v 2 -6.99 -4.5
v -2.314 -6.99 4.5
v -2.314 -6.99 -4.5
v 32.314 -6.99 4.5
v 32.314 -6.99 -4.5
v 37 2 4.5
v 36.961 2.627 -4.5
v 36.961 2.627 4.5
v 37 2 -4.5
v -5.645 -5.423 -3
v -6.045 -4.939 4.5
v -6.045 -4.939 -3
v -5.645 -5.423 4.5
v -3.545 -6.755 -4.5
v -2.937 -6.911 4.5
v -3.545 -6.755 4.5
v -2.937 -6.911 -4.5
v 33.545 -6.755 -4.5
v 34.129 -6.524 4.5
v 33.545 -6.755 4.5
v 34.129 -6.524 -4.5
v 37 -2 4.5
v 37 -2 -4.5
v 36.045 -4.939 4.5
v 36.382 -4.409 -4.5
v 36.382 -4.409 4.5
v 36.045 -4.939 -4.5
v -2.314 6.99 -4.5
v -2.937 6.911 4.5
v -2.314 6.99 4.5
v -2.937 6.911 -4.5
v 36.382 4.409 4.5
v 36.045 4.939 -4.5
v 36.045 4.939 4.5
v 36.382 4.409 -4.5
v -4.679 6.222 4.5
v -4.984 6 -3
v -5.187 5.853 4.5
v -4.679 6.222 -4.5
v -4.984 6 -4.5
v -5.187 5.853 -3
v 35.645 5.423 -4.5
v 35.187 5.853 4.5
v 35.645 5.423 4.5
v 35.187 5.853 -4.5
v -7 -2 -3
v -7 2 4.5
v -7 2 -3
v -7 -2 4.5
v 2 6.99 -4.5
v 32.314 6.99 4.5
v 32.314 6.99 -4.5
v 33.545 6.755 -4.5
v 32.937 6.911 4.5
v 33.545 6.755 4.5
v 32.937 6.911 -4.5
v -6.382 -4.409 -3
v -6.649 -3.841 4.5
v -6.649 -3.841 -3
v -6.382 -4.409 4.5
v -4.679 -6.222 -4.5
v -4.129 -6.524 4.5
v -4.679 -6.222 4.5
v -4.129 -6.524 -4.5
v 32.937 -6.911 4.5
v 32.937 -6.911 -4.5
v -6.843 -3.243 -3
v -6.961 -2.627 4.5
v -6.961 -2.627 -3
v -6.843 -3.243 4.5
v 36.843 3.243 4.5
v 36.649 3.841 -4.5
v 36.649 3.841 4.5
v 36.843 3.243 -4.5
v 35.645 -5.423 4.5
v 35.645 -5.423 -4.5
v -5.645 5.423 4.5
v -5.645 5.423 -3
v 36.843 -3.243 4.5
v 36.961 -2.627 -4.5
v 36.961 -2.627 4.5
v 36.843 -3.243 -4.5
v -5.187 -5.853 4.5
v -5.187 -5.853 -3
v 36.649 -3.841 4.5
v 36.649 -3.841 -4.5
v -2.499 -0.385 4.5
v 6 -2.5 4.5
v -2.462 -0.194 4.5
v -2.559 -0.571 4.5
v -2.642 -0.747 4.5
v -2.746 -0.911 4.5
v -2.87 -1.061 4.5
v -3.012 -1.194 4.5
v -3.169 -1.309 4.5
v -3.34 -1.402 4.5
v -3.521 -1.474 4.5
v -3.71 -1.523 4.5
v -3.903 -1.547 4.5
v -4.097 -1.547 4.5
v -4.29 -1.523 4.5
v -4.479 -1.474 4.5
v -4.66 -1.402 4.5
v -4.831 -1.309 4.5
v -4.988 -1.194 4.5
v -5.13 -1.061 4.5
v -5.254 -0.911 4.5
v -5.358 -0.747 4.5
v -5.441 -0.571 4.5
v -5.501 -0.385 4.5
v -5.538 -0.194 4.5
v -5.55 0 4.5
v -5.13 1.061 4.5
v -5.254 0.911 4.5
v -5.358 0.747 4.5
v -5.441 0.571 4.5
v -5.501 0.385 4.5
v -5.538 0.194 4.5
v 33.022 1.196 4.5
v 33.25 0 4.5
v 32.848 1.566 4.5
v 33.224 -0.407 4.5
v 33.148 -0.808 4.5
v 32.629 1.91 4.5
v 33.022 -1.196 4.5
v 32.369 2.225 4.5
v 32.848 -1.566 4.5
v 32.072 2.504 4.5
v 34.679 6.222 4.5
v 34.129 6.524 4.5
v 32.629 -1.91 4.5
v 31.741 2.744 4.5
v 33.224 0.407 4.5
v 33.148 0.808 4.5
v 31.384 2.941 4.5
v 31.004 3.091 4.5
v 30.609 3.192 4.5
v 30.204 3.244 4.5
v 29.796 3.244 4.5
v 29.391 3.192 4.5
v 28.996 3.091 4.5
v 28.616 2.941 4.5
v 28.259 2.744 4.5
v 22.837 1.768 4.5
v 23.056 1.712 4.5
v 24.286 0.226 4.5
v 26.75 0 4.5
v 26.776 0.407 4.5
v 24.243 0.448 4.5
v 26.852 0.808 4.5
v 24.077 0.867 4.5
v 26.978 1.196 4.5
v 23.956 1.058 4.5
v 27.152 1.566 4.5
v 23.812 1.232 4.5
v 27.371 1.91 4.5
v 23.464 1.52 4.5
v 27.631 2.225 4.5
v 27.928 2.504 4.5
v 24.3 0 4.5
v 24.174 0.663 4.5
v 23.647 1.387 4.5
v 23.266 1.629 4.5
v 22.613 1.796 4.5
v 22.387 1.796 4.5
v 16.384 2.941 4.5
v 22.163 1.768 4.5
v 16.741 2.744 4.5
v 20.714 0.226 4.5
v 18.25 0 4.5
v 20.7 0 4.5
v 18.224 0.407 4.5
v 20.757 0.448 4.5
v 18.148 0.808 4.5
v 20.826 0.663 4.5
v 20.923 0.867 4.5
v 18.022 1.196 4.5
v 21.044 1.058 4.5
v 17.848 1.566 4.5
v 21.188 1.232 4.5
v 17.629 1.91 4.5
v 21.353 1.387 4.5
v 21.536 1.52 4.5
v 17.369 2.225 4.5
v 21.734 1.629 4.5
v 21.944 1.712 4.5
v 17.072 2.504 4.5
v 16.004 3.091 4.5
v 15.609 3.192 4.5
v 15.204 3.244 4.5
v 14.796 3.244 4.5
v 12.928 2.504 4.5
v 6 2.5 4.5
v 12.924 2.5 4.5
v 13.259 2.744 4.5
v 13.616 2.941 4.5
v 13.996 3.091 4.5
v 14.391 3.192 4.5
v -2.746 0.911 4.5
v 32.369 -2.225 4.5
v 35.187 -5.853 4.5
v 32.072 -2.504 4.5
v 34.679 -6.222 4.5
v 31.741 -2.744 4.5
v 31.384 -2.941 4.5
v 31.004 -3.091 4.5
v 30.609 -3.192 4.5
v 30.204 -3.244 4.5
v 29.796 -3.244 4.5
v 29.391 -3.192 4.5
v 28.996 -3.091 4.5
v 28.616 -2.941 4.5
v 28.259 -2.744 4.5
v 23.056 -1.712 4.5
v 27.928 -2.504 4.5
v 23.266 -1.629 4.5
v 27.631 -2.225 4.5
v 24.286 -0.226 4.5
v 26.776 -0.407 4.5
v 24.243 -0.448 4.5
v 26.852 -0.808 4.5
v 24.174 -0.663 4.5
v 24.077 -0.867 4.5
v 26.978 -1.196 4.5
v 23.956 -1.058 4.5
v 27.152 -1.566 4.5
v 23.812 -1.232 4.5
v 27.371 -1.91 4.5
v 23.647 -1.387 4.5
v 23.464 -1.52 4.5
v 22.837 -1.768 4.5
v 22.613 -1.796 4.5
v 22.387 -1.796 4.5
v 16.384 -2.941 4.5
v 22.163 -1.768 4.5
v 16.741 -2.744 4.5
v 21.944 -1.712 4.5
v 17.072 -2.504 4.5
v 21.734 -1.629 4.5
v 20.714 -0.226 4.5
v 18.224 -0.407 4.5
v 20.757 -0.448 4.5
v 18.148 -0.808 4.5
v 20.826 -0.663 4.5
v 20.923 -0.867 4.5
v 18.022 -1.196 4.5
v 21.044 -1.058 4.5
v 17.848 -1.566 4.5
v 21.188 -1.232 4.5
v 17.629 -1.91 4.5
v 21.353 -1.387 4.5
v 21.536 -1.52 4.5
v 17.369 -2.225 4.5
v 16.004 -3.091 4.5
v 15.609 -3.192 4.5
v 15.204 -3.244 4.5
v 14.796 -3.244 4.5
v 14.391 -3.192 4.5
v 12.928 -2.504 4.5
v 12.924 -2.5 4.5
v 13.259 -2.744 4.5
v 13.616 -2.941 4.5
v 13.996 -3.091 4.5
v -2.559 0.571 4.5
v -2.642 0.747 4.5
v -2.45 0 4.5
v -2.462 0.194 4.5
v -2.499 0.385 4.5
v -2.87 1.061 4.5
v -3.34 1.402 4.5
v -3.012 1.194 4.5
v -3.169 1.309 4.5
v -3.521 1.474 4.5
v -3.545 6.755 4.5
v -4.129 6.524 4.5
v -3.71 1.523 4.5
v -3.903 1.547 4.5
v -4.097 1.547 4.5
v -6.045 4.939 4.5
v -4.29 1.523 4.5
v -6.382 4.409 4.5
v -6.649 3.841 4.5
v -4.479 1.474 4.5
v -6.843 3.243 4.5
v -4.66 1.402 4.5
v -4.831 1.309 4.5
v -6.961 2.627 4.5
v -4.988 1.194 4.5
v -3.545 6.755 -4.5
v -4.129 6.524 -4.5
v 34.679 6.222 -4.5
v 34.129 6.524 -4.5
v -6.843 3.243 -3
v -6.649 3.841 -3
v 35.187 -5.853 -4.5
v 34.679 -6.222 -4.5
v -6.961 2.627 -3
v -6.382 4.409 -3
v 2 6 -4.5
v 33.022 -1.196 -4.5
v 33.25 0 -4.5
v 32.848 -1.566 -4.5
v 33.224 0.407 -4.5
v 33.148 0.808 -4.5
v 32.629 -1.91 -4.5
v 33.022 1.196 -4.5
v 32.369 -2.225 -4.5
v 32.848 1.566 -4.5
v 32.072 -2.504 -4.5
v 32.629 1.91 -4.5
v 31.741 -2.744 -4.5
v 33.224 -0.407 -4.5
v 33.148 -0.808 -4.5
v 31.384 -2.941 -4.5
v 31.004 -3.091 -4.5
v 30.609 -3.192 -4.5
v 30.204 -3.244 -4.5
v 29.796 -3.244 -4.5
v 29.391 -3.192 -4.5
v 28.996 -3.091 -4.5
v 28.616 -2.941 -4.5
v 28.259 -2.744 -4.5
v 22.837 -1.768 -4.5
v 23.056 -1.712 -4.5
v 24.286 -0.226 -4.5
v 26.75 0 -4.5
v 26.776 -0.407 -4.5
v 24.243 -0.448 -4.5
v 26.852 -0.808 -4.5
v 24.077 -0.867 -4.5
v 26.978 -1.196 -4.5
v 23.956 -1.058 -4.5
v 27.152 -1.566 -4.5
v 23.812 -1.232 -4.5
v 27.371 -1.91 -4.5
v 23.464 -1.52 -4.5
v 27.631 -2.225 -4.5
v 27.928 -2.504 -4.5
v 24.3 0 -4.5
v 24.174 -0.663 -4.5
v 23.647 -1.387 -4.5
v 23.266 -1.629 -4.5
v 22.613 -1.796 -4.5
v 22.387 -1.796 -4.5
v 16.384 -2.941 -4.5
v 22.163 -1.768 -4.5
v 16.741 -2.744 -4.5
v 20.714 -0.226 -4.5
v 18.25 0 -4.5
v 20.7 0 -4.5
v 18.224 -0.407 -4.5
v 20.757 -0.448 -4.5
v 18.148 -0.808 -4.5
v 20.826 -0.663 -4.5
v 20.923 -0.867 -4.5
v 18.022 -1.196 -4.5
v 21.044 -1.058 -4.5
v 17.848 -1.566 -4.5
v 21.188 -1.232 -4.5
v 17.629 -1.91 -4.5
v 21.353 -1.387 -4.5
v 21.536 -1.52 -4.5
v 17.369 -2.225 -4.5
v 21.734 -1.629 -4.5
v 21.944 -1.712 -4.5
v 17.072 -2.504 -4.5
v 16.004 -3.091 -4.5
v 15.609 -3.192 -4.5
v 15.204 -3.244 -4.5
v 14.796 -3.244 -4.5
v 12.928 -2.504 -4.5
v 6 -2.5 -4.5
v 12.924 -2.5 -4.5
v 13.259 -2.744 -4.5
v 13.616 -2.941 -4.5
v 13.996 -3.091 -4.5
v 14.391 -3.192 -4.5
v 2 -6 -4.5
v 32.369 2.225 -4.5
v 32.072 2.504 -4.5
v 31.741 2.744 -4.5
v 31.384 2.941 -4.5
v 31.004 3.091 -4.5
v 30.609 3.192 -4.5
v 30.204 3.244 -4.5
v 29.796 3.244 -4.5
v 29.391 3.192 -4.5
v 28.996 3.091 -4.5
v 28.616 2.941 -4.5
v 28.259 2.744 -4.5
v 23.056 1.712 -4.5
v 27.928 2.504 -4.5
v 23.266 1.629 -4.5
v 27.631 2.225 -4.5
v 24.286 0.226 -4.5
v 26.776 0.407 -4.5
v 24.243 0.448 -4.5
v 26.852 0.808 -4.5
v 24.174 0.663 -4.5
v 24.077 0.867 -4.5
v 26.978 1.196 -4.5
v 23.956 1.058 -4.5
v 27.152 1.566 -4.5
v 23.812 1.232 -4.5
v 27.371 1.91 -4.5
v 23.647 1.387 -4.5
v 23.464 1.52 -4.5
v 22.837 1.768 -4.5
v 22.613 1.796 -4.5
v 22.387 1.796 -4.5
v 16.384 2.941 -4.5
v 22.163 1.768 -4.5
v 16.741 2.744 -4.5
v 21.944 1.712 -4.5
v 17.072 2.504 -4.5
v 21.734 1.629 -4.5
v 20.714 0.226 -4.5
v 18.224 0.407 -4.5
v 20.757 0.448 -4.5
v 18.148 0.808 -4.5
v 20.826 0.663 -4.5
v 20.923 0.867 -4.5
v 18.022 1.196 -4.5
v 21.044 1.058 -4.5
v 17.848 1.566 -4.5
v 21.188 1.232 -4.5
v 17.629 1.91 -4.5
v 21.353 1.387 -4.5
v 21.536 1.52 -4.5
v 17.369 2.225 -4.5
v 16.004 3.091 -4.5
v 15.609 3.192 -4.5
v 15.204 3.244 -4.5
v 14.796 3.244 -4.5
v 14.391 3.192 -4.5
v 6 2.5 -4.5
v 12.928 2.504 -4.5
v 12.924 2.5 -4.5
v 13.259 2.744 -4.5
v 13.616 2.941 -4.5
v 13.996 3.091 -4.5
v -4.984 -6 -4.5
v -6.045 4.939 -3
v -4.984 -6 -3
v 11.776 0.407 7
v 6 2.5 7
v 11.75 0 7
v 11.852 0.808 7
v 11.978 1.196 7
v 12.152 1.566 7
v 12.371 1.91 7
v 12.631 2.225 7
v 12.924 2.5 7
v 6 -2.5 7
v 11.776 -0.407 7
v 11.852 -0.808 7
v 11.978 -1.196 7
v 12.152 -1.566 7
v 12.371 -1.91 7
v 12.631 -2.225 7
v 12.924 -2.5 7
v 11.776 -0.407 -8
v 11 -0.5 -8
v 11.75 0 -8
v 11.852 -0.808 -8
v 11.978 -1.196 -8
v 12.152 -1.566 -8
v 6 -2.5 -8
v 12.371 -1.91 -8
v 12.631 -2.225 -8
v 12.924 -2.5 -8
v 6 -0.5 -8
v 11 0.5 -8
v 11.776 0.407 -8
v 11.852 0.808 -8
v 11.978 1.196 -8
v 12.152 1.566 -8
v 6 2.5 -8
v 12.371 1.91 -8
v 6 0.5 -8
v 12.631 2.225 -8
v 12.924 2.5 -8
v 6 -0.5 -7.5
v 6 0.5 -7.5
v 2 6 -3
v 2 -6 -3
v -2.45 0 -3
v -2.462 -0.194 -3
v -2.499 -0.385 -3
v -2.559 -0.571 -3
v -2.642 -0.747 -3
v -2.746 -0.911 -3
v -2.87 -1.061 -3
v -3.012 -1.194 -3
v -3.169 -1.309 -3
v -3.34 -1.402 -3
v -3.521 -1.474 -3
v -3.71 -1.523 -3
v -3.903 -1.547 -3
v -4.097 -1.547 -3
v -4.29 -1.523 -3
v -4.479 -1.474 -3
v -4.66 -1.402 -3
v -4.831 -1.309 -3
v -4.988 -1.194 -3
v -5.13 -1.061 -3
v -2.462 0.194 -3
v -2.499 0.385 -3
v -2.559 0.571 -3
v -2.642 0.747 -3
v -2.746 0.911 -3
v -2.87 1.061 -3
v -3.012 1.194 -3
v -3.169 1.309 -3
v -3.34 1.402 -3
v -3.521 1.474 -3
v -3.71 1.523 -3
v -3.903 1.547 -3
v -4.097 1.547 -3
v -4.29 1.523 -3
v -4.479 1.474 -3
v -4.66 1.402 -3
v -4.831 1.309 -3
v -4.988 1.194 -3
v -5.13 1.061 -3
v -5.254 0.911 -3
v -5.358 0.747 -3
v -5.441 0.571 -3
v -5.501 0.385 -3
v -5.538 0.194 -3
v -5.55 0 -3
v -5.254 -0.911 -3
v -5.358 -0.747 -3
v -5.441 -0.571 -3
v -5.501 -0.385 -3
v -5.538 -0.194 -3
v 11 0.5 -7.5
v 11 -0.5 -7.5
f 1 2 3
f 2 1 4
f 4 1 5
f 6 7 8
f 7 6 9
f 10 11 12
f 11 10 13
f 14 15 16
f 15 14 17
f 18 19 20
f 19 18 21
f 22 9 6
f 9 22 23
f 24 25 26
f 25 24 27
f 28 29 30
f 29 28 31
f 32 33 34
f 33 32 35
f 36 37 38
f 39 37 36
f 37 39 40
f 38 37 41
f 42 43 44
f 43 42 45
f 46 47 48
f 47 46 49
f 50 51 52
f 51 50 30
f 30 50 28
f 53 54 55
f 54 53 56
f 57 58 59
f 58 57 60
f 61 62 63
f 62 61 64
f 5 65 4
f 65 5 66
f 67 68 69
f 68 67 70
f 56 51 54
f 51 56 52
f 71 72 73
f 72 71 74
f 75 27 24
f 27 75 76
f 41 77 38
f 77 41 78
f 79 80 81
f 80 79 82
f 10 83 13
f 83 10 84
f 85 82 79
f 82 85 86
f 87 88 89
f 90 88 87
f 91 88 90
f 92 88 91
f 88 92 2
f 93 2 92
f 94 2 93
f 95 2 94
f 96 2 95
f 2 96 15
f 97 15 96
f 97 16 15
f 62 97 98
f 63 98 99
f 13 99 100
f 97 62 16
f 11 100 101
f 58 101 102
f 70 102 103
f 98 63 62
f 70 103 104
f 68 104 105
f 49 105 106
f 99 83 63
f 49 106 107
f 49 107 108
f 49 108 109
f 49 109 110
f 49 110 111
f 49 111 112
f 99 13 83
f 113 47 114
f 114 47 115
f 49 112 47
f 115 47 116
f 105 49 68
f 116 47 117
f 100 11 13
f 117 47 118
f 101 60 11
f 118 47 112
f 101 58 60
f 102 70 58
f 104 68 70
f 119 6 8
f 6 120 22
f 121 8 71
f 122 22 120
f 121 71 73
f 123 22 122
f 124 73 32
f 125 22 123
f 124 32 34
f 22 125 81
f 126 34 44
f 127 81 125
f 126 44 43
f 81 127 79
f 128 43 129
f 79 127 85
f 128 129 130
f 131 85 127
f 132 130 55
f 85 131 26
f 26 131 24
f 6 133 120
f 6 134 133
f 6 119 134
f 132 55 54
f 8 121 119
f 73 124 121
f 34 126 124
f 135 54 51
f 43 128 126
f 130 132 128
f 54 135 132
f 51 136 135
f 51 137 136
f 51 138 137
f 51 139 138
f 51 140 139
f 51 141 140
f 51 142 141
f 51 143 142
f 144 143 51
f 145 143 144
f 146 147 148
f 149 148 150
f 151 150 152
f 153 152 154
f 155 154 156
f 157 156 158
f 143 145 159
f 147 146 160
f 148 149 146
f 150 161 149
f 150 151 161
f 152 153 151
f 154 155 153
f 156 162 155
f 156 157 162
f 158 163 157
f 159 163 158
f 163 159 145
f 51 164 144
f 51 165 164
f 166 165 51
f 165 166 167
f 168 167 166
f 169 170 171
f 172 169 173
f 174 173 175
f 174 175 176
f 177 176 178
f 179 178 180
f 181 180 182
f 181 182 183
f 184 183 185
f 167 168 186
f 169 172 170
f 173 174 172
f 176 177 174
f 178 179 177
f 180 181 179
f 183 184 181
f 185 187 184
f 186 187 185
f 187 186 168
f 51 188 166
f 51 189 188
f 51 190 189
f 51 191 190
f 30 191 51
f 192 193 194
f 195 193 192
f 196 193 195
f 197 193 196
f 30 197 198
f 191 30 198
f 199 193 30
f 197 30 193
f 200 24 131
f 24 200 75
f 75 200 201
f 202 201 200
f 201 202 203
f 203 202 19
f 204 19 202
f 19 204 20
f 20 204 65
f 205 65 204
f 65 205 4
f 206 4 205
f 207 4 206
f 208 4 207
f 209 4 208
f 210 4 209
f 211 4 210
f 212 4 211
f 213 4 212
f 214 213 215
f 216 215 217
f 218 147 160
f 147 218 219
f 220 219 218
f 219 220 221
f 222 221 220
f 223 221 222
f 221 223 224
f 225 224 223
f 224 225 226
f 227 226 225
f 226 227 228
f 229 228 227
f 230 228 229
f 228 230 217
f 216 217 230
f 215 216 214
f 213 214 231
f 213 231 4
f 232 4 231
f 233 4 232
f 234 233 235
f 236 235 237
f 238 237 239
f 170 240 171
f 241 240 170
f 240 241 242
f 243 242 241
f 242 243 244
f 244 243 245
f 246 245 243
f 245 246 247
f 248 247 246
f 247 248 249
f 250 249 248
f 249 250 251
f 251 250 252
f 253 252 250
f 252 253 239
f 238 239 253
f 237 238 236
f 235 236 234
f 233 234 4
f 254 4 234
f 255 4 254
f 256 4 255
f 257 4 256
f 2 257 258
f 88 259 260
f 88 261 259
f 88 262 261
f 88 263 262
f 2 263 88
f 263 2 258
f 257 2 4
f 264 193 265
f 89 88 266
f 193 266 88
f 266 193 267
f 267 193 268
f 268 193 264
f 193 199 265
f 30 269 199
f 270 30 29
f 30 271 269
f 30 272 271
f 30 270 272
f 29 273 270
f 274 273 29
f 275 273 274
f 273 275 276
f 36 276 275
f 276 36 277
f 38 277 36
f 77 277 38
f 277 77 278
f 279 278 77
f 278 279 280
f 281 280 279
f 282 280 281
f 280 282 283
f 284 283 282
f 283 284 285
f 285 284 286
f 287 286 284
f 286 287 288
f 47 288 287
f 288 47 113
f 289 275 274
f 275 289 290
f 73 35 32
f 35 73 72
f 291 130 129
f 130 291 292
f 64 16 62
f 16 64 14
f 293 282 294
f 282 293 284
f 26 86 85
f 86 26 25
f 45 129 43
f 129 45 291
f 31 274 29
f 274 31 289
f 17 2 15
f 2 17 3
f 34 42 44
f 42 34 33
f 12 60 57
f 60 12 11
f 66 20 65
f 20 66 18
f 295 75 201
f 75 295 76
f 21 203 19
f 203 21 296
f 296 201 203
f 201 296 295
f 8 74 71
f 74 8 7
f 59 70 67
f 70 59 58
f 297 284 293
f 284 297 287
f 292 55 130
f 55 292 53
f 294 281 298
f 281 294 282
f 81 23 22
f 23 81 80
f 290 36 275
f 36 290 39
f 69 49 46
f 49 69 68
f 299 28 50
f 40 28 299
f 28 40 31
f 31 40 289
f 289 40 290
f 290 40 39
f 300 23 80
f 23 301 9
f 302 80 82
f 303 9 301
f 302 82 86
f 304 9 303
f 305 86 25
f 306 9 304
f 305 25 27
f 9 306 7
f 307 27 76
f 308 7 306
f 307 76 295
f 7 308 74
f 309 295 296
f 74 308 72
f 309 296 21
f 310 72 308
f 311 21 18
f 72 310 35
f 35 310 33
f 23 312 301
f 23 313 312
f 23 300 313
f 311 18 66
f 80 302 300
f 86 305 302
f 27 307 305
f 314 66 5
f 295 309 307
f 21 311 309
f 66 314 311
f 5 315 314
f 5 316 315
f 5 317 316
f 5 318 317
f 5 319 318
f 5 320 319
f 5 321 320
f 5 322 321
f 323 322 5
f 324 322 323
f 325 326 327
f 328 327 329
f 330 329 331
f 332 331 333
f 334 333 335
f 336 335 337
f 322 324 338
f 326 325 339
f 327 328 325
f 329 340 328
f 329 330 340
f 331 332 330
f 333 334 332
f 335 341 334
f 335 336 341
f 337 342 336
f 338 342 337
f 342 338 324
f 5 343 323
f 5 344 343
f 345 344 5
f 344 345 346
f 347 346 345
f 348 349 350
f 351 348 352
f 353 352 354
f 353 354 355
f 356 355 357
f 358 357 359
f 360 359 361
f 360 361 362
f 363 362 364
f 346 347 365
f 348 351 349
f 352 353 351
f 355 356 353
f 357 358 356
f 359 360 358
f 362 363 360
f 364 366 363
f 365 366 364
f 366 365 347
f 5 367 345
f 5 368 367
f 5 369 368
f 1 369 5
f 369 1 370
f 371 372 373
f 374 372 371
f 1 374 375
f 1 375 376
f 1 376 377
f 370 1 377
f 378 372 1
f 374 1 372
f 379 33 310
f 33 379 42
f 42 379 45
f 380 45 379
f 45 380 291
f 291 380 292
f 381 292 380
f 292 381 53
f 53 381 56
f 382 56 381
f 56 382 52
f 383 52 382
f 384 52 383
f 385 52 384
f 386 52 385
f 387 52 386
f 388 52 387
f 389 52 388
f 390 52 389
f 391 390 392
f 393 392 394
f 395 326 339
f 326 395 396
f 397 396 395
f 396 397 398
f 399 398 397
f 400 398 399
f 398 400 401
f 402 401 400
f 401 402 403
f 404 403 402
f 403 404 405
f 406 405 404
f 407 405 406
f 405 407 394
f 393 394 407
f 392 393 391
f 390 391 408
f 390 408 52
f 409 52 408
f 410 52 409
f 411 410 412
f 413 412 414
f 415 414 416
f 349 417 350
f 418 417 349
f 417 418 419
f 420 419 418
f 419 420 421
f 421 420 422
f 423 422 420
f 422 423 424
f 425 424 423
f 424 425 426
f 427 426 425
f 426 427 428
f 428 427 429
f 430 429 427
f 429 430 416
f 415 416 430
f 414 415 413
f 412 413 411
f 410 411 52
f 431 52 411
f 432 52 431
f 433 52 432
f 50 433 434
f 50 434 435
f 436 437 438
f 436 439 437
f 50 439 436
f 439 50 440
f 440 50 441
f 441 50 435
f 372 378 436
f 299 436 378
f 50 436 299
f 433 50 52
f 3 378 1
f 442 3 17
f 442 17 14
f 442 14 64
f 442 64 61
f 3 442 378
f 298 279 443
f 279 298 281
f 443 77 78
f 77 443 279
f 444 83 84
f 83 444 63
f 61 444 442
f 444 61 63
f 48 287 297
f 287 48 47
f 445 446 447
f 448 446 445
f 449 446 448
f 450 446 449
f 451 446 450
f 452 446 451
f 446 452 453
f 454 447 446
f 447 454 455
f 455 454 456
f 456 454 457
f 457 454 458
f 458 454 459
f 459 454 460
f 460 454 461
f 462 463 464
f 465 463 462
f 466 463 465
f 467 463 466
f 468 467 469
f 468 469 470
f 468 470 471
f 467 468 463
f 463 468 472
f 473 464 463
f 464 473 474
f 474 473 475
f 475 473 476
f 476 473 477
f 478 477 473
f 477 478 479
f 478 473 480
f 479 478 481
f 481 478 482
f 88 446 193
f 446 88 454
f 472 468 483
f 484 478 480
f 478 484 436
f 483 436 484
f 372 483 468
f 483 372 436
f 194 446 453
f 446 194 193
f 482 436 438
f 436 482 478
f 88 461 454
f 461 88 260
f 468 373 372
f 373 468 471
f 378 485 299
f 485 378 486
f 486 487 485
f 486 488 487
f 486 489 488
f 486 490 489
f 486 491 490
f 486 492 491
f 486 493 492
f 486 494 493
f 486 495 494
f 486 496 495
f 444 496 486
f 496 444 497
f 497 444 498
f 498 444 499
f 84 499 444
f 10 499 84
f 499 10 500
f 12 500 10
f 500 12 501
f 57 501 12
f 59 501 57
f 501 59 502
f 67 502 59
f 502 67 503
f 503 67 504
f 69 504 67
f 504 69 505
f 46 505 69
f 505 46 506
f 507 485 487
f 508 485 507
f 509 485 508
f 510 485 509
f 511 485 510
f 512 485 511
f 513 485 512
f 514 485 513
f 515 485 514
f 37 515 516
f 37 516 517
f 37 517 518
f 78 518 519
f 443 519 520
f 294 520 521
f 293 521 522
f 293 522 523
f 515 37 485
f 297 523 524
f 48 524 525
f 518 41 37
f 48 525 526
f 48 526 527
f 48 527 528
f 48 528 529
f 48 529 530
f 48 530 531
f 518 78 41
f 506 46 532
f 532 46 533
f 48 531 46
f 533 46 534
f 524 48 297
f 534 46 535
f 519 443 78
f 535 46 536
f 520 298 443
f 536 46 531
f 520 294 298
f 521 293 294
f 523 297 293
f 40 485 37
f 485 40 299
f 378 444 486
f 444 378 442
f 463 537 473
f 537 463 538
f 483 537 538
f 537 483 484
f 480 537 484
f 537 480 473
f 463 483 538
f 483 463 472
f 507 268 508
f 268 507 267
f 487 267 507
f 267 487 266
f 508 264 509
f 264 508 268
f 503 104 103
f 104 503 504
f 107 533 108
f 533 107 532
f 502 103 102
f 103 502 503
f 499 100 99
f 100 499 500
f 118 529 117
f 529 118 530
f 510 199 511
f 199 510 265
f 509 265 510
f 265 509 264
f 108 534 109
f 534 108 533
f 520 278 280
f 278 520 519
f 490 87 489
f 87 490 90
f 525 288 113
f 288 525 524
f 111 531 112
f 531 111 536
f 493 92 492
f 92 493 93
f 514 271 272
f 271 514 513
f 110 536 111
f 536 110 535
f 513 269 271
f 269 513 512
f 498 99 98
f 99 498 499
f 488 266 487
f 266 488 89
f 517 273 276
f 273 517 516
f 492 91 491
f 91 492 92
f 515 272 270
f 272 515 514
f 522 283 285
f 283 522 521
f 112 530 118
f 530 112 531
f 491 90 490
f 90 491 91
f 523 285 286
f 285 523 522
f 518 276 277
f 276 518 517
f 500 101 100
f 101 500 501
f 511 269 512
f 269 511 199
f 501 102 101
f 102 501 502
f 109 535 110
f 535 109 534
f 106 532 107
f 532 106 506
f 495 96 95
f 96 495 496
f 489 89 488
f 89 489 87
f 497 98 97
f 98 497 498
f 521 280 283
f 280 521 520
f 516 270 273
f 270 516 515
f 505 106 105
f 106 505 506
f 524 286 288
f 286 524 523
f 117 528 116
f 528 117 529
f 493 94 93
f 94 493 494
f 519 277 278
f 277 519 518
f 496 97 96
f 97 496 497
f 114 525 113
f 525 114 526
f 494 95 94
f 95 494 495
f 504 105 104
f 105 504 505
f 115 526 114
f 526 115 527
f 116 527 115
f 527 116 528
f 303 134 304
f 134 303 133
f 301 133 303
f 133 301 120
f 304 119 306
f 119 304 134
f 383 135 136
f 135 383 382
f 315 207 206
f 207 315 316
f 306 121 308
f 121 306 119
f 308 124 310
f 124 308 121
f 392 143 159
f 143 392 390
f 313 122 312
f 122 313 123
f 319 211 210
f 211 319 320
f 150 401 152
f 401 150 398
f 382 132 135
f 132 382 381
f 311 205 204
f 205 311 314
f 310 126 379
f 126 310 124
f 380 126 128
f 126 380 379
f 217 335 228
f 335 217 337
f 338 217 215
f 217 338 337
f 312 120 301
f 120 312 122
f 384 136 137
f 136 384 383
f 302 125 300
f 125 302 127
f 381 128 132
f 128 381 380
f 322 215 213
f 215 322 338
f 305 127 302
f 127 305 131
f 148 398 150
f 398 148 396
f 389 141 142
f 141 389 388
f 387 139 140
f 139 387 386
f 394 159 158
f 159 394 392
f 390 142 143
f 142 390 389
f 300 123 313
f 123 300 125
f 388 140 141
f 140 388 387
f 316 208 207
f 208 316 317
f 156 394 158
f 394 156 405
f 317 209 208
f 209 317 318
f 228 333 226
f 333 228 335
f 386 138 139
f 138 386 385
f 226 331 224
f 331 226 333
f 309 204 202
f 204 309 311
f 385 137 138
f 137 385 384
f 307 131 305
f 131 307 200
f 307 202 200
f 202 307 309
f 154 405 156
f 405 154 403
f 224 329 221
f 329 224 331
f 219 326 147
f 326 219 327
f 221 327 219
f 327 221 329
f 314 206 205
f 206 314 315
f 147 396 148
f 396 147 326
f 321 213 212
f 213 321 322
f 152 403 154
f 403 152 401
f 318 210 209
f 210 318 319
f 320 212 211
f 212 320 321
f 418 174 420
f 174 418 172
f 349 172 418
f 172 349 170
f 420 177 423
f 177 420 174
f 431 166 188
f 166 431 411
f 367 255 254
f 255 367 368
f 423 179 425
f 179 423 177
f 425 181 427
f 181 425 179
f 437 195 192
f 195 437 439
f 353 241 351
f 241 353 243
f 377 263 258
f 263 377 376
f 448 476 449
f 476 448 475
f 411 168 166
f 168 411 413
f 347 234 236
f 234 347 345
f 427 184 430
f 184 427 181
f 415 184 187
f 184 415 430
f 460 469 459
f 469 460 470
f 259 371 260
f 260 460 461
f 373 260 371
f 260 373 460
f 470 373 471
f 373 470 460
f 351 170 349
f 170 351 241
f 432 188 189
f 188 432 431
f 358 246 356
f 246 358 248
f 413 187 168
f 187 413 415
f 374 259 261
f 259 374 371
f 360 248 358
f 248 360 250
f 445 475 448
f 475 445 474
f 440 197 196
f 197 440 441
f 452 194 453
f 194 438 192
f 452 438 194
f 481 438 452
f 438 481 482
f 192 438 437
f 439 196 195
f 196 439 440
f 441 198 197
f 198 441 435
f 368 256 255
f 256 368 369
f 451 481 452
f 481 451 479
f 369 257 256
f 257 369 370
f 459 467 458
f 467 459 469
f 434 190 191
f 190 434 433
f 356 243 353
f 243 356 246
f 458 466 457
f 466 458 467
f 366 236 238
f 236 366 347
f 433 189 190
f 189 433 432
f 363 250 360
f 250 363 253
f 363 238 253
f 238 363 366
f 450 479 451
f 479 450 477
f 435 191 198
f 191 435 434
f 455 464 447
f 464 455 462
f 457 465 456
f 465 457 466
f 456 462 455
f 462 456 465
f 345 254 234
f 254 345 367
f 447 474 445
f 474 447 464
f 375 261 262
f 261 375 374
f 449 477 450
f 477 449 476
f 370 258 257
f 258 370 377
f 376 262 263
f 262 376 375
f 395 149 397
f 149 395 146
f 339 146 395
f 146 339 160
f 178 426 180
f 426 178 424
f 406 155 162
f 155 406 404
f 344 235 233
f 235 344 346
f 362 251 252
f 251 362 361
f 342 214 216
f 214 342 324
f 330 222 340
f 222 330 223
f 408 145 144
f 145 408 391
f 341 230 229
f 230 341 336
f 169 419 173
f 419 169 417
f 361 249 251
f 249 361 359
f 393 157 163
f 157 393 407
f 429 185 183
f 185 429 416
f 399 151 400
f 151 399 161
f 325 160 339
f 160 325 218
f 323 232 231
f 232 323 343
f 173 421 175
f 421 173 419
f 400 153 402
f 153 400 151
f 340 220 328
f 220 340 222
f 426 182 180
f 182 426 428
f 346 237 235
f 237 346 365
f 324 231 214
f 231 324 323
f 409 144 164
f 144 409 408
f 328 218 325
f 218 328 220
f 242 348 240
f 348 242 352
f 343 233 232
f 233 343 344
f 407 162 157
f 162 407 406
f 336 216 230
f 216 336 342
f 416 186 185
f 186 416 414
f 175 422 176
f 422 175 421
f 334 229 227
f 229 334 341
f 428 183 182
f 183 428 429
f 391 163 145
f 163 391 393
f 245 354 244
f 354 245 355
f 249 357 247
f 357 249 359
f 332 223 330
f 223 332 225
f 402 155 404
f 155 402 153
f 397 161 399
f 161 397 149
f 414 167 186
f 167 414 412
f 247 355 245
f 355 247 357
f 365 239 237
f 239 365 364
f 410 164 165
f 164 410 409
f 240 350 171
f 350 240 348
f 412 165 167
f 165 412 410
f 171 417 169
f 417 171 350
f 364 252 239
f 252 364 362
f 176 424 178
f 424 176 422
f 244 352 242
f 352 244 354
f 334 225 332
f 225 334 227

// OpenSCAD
$fn = 50;


difference() {
	union() {
		*color(alpha = 1.0000000000, c = "gray") {
			translate(v = [15.0000000000, 14, -4.5000000000]) {
				linear_extrude(height = 1) {
					text(font = "Arial:style=Bold", halign = "center", size = 4.5000000000, text = "COMMENT description oobb_plate_shape_positive_type_9_depth_15.0_0_-4.5_pos_electronic_potentiometer_stick_single_axis_16_mm_arm_extra_3_width_1_height_9_thickness_15.0_0_-4.5_pos_plate", valign = "center");
				}
			}
		}
		translate(v = [15.0000000000, 0, -4.5000000000]) {
			hull() {
				translate(v = [-17.0000000000, 2.0000000000, 0]) {
					cylinder(h = 9, r = 5);
				}
				translate(v = [17.0000000000, 2.0000000000, 0]) {
					cylinder(h = 9, r = 5);
				}
				translate(v = [-17.0000000000, -2.0000000000, 0]) {
					cylinder(h = 9, r = 5);
				}
				translate(v = [17.0000000000, -2.0000000000, 0]) {
					cylinder(h = 9, r = 5);
				}
			}
		}
		*color(alpha = 1.0000000000, c = "gray") {
			translate(v = [11, 14, -8]) {
				linear_extrude(height = 1) {
					text(font = "Arial:style=Bold", halign = "center", size = 4.5000000000, text = "COMMENT description oobb_cube_center_shape_positive_type_11_0_-8_pos_electronic_potentiometer_stick_single_axis_16_mm_arm_extra_3_width_1_height_9_thickness_15.0_0_-4.5_pos_plate_10_5_15_size", valign = "center");
				}
			}
		}
		translate(v = [6.0000000000, -2.5000000000, -8]) {
			cube(size = [10, 5, 15]);
		}
	}
	union() {
		translate(v = [-10, 0, -12.5000000000]) {
			rotate(a = [0, 90, 0]) {
				difference() {
					union() {
						translate(v = [-8.0000000000, -8.0000000000, 0]) {
							cube(size = [16, 16, 12]);
						}
						translate(v = [5.2500000000, 6.7500000000, -4]) {
							cube(size = [3, 1.5000000000, 4]);
						}
						translate(v = [-8.2500000000, 6.7500000000, -4]) {
							cube(size = [3, 1.5000000000, 4]);
						}
						translate(v = [5.2500000000, -8.2500000000, -4]) {
							cube(size = [3, 1.5000000000, 4]);
						}
						translate(v = [-8.2500000000, -8.2500000000, -4]) {
							cube(size = [3, 1.5000000000, 4]);
						}
						translate(v = [4.5000000000, -9.5000000000, 0]) {
							cube(size = [2, 19, 3.5000000000]);
						}
						translate(v = [-6.5000000000, -9.5000000000, 0]) {
							cube(size = [2, 19, 3.5000000000]);
						}
						translate(v = [8.0000000000, -6.0000000000, -4]) {
							cube(size = [4, 12, 16]);
						}
						translate(v = [-9.5000000000, -6.0000000000, -4]) {
							cube(size = [1.5000000000, 12, 16]);
						}
						translate(v = [-5.0000000000, -0.5000000000, 12]) {
							cube(size = [10, 1, 9]);
						}
					}
					union();
				}
			}
		}
		*color(alpha = 1.0000000000, c = "gray") {
			translate(v = [-4, 14, 0]) {
				linear_extrude(height = 1) {
					text(font = "Arial:style=Bold", halign = "center", size = 4.5000000000, text = "COMMENT description oobb_hole_shape_negative_type_m2d5_radius_name_-4_0_0_pos_electronic_potentiometer_stick_single_axis_16_mm_arm_extra_3_width_1_height_9_thickness_15.0_0_-4.5_pos_plate", valign = "center");
				}
			}
		}
		translate(v = [-4, 0, -50.0000000000]) {
			cylinder(h = 100, r = 1.5500000000);
		}
		*color(alpha = 1.0000000000, c = "gray") {
			translate(v = [15.0000000000, 14, -4.5000000000]) {
				linear_extrude(height = 1) {
					text(font = "Arial:style=Bold", halign = "center", size = 4.5000000000, text = "COMMENT description oobb_holes_shape_negative_type_15.0_0_-4.5_pos_electronic_potentiometer_stick_single_axis_16_mm_arm_extra_3_width_1_height_9_thickness_15.0_0_-4.5_pos_plate_single_holes_3_1_2_1_loc", valign = "center");
				}
			}
		}
		translate(v = [30.0000000000, 0.0000000000, -50.0000000000]) {
			cylinder(h = 100, r = 3.2500000000);
		}
		translate(v = [15.0000000000, 0.0000000000, -50.0000000000]) {
			cylinder(h = 100, r = 3.2500000000);
		}
		*color(alpha = 1.0000000000, c = "gray") {
			translate(v = [15.0000000000, 14, -4.5000000000]) {
				linear_extrude(height = 1) {
					text(font = "Arial:style=Bold", halign = "center", size = 4.5000000000, text = "COMMENT description oobb_holes_shape_negative_type_m3_radius_name_15.0_0_-4.5_pos_electronic_potentiometer_stick_single_axis_16_mm_arm_extra_3_width_1_height_9_thickness_15.0_0_-4.5_pos_plate_single_holes_2.5_1_loc", valign = "center");
				}
			}
		}
		translate(v = [22.5000000000, 0.0000000000, -50.0000000000]) {
			cylinder(h = 100, r = 1.8000000000);
		}
		*color(alpha = 1.0000000000, c = "gray") {
			translate(v = [-10, 14, -12.5000000000]) {
				rotate(a = [0, 90, 0]) {
					linear_extrude(height = 1) {
						text(font = "Arial:style=Bold", halign = "center", size = 4.5000000000, text = "COMMENT description oobb_electronic_potentiometer_stick_single_axis_16_mm_shape_negative_type_-10_0_-12.5_pos_electronic_potentiometer_stick_single_axis_16_mm_arm_extra_3_width_1_height_9_thickness_15.0_0_-4.5_pos_plate_0_90_0_rot_10_width_stick", valign = "center");
					}
				}
			}
		}
	}
}
